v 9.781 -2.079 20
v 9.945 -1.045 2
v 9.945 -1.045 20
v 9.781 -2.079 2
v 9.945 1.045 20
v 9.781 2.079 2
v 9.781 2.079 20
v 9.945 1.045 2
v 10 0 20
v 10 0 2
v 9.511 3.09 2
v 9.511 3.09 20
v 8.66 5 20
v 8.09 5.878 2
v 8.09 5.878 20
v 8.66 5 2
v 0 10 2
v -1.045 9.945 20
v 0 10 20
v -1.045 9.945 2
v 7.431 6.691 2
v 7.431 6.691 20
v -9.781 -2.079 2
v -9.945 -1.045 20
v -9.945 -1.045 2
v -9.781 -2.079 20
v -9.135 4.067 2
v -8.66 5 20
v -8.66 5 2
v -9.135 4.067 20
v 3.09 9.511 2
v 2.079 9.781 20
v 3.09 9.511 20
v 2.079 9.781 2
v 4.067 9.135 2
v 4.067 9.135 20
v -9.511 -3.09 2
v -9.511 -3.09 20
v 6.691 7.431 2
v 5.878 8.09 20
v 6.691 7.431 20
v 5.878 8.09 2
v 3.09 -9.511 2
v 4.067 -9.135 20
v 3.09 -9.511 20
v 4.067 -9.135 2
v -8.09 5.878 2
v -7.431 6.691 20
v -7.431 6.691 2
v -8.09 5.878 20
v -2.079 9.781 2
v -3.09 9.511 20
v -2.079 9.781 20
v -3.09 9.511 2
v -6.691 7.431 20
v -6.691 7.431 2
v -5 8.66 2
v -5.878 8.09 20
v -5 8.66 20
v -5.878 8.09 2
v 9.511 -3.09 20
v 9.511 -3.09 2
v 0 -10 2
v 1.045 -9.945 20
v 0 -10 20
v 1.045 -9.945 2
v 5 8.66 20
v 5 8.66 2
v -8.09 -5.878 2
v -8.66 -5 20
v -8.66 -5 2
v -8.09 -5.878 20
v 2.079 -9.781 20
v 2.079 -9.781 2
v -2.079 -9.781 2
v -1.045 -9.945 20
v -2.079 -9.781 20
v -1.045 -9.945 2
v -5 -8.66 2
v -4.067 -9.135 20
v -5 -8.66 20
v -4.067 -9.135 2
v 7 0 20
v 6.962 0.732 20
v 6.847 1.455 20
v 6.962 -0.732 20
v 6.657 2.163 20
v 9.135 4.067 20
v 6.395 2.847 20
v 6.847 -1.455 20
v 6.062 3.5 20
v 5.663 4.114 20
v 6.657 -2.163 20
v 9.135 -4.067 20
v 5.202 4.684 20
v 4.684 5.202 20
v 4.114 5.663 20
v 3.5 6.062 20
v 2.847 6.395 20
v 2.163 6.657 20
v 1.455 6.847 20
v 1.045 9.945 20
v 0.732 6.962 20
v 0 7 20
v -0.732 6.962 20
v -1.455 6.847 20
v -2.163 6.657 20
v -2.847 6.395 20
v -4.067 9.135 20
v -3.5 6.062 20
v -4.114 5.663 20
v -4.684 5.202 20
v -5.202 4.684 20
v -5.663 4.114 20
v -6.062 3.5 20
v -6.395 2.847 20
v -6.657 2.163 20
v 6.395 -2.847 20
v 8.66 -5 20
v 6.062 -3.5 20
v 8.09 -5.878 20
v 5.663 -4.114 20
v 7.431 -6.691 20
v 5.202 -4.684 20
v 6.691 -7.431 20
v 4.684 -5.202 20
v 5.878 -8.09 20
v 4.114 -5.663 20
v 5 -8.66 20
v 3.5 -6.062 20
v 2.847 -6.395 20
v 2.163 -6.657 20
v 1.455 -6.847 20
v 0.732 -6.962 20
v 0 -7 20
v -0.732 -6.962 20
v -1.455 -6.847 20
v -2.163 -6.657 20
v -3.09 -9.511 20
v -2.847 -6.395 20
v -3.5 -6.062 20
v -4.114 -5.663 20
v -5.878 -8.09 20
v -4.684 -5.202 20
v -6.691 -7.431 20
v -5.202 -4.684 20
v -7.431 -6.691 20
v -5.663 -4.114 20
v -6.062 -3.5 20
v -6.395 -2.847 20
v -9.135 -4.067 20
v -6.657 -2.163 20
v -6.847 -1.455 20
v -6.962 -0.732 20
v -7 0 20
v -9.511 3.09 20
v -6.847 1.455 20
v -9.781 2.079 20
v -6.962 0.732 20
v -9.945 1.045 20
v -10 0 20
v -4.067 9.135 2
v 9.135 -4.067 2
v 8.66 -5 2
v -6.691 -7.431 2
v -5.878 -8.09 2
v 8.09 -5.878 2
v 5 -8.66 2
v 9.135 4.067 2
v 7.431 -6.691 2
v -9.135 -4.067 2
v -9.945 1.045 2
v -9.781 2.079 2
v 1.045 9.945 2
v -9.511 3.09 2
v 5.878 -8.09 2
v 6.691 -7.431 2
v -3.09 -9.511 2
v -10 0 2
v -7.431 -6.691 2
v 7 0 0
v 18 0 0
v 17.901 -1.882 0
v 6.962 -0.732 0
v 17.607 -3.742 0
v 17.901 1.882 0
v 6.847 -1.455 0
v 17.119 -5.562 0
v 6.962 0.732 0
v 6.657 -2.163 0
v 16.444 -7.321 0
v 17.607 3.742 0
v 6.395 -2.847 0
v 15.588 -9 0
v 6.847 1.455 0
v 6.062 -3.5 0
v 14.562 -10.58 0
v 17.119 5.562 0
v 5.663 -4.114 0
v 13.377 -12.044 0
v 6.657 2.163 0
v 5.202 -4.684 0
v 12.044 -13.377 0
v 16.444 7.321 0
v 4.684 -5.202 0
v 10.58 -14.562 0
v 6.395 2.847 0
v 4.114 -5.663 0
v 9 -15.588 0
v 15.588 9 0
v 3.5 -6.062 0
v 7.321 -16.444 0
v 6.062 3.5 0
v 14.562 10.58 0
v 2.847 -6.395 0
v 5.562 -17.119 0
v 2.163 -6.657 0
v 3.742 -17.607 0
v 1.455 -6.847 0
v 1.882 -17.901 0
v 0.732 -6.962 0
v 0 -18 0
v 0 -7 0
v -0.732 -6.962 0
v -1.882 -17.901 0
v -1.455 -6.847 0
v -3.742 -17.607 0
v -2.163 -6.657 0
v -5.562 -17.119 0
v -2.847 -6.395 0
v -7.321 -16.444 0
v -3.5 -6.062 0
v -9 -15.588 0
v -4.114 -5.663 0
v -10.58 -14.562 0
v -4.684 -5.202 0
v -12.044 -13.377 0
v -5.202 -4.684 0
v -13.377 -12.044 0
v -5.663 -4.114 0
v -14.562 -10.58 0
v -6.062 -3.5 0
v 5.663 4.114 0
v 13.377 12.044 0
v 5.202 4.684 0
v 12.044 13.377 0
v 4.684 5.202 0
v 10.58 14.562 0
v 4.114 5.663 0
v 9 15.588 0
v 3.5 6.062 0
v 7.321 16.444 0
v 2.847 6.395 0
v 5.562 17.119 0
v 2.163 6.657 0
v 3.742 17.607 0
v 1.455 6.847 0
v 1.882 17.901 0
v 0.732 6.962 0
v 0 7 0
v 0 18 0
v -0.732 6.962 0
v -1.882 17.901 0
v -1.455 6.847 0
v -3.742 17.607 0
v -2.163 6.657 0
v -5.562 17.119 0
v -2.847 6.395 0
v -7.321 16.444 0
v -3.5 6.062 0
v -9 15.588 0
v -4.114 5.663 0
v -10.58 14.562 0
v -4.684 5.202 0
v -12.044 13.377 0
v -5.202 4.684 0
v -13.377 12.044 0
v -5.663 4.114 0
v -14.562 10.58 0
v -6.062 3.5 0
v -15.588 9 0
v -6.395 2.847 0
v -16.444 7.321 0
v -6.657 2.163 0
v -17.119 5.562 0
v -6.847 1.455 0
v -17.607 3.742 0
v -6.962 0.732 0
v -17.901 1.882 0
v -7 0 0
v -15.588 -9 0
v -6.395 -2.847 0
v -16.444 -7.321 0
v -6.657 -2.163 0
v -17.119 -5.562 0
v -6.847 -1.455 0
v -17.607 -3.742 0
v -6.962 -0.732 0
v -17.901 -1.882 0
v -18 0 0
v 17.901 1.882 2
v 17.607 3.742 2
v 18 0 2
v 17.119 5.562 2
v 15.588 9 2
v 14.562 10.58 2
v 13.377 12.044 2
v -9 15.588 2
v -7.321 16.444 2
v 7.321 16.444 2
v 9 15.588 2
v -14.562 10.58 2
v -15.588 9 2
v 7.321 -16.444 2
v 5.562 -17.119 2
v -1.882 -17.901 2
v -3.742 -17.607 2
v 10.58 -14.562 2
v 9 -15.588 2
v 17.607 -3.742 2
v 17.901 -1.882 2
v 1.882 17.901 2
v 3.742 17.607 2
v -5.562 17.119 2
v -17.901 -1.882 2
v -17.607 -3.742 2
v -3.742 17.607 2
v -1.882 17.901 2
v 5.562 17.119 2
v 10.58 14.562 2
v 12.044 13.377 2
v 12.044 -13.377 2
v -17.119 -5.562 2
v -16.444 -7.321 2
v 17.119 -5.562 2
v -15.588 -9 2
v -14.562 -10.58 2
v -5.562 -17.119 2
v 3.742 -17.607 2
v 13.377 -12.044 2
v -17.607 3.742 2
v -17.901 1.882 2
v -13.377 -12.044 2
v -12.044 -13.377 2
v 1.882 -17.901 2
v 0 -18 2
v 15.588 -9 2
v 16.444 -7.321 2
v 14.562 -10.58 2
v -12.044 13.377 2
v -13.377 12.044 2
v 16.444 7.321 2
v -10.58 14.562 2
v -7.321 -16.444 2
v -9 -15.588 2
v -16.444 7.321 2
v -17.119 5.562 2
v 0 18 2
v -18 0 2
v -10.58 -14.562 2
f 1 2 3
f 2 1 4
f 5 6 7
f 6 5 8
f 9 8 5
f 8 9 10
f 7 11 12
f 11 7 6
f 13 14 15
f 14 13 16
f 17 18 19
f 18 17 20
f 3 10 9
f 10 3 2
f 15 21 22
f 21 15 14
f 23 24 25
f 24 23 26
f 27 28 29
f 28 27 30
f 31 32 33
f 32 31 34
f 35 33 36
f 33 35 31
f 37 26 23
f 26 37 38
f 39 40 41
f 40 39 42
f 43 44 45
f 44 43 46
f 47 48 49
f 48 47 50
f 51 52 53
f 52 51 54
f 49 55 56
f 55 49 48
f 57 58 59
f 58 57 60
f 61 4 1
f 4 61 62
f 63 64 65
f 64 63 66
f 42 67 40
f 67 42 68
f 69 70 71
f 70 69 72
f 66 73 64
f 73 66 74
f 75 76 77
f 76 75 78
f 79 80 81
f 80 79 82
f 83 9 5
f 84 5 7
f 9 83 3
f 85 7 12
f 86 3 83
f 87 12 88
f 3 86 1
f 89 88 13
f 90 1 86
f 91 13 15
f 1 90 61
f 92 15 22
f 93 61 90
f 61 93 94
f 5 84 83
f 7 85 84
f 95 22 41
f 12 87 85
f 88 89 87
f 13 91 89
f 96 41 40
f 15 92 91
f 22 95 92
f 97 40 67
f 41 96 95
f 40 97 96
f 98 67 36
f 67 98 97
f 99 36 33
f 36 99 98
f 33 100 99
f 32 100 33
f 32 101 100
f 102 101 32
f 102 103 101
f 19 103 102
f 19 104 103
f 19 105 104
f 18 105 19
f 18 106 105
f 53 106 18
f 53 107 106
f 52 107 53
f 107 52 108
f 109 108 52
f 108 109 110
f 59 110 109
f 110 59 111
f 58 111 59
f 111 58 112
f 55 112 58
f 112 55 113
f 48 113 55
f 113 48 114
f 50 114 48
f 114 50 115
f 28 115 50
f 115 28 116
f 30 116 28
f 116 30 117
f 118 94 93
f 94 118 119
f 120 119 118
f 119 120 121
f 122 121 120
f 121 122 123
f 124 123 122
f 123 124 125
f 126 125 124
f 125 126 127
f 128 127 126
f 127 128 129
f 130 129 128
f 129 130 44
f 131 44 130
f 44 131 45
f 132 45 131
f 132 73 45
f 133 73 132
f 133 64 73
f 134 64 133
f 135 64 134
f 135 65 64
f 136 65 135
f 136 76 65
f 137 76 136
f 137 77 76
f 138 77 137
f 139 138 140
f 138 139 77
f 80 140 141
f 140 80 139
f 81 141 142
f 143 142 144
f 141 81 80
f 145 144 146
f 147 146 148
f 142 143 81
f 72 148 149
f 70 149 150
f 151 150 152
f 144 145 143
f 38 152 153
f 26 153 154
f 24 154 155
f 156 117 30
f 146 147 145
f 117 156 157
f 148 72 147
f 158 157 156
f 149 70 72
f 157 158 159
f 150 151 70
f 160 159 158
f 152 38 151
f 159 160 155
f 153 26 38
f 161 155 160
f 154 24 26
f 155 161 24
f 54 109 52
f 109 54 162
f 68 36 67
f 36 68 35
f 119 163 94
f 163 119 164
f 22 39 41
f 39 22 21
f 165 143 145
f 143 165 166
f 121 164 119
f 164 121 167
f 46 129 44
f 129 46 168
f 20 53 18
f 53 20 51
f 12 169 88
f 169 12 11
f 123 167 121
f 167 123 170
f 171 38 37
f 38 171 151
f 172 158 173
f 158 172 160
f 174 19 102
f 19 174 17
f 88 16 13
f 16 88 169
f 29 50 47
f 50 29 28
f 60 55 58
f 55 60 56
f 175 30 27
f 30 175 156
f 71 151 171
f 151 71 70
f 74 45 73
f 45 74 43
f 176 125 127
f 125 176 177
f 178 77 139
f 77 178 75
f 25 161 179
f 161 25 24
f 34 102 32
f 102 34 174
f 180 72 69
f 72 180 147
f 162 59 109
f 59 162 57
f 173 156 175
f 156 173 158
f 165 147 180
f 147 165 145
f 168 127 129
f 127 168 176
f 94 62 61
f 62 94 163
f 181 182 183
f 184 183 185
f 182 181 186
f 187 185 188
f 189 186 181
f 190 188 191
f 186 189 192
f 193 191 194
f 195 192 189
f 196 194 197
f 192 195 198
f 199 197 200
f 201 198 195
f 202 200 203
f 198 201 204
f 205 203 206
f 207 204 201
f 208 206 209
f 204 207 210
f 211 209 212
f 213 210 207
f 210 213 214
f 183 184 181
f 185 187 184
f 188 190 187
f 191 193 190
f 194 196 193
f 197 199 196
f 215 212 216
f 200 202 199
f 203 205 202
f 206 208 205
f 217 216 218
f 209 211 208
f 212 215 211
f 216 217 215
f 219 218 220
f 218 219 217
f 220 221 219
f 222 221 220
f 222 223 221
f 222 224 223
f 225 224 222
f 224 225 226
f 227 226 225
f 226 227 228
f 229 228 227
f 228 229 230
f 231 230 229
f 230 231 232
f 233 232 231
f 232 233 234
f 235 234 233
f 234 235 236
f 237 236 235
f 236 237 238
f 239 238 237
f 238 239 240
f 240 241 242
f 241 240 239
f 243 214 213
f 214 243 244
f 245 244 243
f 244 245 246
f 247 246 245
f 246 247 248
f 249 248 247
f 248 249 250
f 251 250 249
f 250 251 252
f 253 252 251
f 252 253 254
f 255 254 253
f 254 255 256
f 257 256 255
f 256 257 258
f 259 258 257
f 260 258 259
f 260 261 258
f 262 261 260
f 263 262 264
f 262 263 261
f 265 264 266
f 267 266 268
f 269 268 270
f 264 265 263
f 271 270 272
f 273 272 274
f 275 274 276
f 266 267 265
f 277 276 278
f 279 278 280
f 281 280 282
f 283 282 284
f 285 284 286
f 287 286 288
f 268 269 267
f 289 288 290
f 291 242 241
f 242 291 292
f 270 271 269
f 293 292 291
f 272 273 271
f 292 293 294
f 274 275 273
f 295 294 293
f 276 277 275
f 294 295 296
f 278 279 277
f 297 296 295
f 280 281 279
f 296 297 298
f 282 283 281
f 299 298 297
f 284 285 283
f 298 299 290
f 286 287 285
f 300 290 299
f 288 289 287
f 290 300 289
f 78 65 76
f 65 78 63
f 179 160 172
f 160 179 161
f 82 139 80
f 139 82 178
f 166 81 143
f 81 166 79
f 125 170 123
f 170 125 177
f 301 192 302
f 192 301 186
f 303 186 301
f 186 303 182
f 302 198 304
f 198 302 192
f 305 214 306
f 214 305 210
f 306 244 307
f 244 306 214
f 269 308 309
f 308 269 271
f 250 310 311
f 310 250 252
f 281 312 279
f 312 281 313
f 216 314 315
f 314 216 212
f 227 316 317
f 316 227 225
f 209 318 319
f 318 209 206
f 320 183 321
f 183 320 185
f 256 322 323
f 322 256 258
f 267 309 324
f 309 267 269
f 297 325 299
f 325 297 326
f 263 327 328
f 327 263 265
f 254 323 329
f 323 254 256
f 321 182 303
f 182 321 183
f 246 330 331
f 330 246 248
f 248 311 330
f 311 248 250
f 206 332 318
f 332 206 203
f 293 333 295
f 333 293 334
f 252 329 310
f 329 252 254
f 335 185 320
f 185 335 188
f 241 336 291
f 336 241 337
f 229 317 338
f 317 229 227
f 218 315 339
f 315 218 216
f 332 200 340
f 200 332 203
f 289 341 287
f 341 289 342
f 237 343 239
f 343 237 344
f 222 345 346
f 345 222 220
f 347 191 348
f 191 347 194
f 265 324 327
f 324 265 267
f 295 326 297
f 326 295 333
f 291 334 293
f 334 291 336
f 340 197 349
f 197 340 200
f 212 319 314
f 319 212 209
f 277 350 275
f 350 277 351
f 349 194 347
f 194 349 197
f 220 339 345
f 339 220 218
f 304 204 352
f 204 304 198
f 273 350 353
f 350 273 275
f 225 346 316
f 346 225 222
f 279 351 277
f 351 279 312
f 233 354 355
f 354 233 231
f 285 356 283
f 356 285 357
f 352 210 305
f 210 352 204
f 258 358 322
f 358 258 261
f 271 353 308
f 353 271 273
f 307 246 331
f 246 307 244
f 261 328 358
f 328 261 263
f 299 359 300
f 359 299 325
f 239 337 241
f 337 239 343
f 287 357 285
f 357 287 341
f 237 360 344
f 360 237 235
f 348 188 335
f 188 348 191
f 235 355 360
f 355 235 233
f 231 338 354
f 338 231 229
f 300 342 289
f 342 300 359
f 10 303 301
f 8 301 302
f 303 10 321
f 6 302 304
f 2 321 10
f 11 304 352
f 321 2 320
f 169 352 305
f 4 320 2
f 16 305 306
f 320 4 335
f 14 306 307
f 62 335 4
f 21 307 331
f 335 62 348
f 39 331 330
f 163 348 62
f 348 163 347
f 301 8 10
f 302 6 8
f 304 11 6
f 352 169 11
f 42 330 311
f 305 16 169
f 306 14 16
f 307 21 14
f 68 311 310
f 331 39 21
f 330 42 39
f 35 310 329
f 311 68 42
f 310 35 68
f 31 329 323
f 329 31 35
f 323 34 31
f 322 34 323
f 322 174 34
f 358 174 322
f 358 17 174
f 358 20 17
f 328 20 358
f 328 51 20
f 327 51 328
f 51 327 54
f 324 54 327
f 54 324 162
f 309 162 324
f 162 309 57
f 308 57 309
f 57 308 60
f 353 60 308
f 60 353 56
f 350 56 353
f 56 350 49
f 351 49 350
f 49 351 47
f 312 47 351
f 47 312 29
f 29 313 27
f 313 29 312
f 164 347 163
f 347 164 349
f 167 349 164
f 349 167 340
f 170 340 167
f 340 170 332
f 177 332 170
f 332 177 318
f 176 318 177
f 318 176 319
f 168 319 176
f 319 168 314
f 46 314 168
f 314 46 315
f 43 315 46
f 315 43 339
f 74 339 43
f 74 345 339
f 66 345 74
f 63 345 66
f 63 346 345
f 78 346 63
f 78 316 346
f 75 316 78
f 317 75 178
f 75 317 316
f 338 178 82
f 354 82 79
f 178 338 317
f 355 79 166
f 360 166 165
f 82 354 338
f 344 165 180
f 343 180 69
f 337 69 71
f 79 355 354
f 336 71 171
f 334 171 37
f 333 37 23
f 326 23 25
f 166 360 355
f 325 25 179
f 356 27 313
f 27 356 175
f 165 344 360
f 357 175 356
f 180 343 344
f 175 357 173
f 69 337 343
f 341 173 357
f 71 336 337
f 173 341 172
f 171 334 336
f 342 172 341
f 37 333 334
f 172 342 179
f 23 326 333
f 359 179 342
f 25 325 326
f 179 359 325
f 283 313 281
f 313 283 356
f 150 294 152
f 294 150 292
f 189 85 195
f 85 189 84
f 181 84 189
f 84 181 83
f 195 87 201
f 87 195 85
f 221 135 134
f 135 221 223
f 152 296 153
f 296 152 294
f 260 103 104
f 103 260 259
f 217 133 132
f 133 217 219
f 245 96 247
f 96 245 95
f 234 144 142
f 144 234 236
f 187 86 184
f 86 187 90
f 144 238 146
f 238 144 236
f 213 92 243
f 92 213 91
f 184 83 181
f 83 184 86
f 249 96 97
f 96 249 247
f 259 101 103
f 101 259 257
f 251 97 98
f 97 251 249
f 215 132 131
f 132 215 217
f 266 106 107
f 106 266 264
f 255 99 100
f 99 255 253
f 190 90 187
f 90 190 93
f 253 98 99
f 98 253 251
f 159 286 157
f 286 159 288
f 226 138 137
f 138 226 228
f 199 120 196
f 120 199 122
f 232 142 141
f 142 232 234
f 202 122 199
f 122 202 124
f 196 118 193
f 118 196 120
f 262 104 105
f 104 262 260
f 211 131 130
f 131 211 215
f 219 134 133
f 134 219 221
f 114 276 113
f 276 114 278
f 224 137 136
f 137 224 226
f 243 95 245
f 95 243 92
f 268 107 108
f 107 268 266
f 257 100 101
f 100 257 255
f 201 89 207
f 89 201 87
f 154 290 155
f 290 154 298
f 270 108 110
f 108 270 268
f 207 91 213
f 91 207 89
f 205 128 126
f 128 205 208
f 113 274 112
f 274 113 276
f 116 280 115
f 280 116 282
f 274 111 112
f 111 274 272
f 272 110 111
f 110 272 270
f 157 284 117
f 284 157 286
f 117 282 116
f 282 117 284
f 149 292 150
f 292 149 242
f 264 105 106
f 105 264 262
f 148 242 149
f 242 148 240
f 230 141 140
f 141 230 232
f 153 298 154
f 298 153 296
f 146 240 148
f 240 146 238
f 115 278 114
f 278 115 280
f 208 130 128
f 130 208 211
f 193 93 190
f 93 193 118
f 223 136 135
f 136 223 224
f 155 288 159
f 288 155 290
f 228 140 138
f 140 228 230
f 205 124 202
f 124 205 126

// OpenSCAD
// Flanged spacer.
$fn = 60;
eps = 0.02;
inner_d = 14;
outer_d = 20;
length = 20;
flange_d = 36;
difference() { union() { cylinder(d=outer_d,h=length); cylinder(d=flange_d,h=2); } translate([0,0,-eps]) cylinder(d=inner_d,h=length+2*eps); }
